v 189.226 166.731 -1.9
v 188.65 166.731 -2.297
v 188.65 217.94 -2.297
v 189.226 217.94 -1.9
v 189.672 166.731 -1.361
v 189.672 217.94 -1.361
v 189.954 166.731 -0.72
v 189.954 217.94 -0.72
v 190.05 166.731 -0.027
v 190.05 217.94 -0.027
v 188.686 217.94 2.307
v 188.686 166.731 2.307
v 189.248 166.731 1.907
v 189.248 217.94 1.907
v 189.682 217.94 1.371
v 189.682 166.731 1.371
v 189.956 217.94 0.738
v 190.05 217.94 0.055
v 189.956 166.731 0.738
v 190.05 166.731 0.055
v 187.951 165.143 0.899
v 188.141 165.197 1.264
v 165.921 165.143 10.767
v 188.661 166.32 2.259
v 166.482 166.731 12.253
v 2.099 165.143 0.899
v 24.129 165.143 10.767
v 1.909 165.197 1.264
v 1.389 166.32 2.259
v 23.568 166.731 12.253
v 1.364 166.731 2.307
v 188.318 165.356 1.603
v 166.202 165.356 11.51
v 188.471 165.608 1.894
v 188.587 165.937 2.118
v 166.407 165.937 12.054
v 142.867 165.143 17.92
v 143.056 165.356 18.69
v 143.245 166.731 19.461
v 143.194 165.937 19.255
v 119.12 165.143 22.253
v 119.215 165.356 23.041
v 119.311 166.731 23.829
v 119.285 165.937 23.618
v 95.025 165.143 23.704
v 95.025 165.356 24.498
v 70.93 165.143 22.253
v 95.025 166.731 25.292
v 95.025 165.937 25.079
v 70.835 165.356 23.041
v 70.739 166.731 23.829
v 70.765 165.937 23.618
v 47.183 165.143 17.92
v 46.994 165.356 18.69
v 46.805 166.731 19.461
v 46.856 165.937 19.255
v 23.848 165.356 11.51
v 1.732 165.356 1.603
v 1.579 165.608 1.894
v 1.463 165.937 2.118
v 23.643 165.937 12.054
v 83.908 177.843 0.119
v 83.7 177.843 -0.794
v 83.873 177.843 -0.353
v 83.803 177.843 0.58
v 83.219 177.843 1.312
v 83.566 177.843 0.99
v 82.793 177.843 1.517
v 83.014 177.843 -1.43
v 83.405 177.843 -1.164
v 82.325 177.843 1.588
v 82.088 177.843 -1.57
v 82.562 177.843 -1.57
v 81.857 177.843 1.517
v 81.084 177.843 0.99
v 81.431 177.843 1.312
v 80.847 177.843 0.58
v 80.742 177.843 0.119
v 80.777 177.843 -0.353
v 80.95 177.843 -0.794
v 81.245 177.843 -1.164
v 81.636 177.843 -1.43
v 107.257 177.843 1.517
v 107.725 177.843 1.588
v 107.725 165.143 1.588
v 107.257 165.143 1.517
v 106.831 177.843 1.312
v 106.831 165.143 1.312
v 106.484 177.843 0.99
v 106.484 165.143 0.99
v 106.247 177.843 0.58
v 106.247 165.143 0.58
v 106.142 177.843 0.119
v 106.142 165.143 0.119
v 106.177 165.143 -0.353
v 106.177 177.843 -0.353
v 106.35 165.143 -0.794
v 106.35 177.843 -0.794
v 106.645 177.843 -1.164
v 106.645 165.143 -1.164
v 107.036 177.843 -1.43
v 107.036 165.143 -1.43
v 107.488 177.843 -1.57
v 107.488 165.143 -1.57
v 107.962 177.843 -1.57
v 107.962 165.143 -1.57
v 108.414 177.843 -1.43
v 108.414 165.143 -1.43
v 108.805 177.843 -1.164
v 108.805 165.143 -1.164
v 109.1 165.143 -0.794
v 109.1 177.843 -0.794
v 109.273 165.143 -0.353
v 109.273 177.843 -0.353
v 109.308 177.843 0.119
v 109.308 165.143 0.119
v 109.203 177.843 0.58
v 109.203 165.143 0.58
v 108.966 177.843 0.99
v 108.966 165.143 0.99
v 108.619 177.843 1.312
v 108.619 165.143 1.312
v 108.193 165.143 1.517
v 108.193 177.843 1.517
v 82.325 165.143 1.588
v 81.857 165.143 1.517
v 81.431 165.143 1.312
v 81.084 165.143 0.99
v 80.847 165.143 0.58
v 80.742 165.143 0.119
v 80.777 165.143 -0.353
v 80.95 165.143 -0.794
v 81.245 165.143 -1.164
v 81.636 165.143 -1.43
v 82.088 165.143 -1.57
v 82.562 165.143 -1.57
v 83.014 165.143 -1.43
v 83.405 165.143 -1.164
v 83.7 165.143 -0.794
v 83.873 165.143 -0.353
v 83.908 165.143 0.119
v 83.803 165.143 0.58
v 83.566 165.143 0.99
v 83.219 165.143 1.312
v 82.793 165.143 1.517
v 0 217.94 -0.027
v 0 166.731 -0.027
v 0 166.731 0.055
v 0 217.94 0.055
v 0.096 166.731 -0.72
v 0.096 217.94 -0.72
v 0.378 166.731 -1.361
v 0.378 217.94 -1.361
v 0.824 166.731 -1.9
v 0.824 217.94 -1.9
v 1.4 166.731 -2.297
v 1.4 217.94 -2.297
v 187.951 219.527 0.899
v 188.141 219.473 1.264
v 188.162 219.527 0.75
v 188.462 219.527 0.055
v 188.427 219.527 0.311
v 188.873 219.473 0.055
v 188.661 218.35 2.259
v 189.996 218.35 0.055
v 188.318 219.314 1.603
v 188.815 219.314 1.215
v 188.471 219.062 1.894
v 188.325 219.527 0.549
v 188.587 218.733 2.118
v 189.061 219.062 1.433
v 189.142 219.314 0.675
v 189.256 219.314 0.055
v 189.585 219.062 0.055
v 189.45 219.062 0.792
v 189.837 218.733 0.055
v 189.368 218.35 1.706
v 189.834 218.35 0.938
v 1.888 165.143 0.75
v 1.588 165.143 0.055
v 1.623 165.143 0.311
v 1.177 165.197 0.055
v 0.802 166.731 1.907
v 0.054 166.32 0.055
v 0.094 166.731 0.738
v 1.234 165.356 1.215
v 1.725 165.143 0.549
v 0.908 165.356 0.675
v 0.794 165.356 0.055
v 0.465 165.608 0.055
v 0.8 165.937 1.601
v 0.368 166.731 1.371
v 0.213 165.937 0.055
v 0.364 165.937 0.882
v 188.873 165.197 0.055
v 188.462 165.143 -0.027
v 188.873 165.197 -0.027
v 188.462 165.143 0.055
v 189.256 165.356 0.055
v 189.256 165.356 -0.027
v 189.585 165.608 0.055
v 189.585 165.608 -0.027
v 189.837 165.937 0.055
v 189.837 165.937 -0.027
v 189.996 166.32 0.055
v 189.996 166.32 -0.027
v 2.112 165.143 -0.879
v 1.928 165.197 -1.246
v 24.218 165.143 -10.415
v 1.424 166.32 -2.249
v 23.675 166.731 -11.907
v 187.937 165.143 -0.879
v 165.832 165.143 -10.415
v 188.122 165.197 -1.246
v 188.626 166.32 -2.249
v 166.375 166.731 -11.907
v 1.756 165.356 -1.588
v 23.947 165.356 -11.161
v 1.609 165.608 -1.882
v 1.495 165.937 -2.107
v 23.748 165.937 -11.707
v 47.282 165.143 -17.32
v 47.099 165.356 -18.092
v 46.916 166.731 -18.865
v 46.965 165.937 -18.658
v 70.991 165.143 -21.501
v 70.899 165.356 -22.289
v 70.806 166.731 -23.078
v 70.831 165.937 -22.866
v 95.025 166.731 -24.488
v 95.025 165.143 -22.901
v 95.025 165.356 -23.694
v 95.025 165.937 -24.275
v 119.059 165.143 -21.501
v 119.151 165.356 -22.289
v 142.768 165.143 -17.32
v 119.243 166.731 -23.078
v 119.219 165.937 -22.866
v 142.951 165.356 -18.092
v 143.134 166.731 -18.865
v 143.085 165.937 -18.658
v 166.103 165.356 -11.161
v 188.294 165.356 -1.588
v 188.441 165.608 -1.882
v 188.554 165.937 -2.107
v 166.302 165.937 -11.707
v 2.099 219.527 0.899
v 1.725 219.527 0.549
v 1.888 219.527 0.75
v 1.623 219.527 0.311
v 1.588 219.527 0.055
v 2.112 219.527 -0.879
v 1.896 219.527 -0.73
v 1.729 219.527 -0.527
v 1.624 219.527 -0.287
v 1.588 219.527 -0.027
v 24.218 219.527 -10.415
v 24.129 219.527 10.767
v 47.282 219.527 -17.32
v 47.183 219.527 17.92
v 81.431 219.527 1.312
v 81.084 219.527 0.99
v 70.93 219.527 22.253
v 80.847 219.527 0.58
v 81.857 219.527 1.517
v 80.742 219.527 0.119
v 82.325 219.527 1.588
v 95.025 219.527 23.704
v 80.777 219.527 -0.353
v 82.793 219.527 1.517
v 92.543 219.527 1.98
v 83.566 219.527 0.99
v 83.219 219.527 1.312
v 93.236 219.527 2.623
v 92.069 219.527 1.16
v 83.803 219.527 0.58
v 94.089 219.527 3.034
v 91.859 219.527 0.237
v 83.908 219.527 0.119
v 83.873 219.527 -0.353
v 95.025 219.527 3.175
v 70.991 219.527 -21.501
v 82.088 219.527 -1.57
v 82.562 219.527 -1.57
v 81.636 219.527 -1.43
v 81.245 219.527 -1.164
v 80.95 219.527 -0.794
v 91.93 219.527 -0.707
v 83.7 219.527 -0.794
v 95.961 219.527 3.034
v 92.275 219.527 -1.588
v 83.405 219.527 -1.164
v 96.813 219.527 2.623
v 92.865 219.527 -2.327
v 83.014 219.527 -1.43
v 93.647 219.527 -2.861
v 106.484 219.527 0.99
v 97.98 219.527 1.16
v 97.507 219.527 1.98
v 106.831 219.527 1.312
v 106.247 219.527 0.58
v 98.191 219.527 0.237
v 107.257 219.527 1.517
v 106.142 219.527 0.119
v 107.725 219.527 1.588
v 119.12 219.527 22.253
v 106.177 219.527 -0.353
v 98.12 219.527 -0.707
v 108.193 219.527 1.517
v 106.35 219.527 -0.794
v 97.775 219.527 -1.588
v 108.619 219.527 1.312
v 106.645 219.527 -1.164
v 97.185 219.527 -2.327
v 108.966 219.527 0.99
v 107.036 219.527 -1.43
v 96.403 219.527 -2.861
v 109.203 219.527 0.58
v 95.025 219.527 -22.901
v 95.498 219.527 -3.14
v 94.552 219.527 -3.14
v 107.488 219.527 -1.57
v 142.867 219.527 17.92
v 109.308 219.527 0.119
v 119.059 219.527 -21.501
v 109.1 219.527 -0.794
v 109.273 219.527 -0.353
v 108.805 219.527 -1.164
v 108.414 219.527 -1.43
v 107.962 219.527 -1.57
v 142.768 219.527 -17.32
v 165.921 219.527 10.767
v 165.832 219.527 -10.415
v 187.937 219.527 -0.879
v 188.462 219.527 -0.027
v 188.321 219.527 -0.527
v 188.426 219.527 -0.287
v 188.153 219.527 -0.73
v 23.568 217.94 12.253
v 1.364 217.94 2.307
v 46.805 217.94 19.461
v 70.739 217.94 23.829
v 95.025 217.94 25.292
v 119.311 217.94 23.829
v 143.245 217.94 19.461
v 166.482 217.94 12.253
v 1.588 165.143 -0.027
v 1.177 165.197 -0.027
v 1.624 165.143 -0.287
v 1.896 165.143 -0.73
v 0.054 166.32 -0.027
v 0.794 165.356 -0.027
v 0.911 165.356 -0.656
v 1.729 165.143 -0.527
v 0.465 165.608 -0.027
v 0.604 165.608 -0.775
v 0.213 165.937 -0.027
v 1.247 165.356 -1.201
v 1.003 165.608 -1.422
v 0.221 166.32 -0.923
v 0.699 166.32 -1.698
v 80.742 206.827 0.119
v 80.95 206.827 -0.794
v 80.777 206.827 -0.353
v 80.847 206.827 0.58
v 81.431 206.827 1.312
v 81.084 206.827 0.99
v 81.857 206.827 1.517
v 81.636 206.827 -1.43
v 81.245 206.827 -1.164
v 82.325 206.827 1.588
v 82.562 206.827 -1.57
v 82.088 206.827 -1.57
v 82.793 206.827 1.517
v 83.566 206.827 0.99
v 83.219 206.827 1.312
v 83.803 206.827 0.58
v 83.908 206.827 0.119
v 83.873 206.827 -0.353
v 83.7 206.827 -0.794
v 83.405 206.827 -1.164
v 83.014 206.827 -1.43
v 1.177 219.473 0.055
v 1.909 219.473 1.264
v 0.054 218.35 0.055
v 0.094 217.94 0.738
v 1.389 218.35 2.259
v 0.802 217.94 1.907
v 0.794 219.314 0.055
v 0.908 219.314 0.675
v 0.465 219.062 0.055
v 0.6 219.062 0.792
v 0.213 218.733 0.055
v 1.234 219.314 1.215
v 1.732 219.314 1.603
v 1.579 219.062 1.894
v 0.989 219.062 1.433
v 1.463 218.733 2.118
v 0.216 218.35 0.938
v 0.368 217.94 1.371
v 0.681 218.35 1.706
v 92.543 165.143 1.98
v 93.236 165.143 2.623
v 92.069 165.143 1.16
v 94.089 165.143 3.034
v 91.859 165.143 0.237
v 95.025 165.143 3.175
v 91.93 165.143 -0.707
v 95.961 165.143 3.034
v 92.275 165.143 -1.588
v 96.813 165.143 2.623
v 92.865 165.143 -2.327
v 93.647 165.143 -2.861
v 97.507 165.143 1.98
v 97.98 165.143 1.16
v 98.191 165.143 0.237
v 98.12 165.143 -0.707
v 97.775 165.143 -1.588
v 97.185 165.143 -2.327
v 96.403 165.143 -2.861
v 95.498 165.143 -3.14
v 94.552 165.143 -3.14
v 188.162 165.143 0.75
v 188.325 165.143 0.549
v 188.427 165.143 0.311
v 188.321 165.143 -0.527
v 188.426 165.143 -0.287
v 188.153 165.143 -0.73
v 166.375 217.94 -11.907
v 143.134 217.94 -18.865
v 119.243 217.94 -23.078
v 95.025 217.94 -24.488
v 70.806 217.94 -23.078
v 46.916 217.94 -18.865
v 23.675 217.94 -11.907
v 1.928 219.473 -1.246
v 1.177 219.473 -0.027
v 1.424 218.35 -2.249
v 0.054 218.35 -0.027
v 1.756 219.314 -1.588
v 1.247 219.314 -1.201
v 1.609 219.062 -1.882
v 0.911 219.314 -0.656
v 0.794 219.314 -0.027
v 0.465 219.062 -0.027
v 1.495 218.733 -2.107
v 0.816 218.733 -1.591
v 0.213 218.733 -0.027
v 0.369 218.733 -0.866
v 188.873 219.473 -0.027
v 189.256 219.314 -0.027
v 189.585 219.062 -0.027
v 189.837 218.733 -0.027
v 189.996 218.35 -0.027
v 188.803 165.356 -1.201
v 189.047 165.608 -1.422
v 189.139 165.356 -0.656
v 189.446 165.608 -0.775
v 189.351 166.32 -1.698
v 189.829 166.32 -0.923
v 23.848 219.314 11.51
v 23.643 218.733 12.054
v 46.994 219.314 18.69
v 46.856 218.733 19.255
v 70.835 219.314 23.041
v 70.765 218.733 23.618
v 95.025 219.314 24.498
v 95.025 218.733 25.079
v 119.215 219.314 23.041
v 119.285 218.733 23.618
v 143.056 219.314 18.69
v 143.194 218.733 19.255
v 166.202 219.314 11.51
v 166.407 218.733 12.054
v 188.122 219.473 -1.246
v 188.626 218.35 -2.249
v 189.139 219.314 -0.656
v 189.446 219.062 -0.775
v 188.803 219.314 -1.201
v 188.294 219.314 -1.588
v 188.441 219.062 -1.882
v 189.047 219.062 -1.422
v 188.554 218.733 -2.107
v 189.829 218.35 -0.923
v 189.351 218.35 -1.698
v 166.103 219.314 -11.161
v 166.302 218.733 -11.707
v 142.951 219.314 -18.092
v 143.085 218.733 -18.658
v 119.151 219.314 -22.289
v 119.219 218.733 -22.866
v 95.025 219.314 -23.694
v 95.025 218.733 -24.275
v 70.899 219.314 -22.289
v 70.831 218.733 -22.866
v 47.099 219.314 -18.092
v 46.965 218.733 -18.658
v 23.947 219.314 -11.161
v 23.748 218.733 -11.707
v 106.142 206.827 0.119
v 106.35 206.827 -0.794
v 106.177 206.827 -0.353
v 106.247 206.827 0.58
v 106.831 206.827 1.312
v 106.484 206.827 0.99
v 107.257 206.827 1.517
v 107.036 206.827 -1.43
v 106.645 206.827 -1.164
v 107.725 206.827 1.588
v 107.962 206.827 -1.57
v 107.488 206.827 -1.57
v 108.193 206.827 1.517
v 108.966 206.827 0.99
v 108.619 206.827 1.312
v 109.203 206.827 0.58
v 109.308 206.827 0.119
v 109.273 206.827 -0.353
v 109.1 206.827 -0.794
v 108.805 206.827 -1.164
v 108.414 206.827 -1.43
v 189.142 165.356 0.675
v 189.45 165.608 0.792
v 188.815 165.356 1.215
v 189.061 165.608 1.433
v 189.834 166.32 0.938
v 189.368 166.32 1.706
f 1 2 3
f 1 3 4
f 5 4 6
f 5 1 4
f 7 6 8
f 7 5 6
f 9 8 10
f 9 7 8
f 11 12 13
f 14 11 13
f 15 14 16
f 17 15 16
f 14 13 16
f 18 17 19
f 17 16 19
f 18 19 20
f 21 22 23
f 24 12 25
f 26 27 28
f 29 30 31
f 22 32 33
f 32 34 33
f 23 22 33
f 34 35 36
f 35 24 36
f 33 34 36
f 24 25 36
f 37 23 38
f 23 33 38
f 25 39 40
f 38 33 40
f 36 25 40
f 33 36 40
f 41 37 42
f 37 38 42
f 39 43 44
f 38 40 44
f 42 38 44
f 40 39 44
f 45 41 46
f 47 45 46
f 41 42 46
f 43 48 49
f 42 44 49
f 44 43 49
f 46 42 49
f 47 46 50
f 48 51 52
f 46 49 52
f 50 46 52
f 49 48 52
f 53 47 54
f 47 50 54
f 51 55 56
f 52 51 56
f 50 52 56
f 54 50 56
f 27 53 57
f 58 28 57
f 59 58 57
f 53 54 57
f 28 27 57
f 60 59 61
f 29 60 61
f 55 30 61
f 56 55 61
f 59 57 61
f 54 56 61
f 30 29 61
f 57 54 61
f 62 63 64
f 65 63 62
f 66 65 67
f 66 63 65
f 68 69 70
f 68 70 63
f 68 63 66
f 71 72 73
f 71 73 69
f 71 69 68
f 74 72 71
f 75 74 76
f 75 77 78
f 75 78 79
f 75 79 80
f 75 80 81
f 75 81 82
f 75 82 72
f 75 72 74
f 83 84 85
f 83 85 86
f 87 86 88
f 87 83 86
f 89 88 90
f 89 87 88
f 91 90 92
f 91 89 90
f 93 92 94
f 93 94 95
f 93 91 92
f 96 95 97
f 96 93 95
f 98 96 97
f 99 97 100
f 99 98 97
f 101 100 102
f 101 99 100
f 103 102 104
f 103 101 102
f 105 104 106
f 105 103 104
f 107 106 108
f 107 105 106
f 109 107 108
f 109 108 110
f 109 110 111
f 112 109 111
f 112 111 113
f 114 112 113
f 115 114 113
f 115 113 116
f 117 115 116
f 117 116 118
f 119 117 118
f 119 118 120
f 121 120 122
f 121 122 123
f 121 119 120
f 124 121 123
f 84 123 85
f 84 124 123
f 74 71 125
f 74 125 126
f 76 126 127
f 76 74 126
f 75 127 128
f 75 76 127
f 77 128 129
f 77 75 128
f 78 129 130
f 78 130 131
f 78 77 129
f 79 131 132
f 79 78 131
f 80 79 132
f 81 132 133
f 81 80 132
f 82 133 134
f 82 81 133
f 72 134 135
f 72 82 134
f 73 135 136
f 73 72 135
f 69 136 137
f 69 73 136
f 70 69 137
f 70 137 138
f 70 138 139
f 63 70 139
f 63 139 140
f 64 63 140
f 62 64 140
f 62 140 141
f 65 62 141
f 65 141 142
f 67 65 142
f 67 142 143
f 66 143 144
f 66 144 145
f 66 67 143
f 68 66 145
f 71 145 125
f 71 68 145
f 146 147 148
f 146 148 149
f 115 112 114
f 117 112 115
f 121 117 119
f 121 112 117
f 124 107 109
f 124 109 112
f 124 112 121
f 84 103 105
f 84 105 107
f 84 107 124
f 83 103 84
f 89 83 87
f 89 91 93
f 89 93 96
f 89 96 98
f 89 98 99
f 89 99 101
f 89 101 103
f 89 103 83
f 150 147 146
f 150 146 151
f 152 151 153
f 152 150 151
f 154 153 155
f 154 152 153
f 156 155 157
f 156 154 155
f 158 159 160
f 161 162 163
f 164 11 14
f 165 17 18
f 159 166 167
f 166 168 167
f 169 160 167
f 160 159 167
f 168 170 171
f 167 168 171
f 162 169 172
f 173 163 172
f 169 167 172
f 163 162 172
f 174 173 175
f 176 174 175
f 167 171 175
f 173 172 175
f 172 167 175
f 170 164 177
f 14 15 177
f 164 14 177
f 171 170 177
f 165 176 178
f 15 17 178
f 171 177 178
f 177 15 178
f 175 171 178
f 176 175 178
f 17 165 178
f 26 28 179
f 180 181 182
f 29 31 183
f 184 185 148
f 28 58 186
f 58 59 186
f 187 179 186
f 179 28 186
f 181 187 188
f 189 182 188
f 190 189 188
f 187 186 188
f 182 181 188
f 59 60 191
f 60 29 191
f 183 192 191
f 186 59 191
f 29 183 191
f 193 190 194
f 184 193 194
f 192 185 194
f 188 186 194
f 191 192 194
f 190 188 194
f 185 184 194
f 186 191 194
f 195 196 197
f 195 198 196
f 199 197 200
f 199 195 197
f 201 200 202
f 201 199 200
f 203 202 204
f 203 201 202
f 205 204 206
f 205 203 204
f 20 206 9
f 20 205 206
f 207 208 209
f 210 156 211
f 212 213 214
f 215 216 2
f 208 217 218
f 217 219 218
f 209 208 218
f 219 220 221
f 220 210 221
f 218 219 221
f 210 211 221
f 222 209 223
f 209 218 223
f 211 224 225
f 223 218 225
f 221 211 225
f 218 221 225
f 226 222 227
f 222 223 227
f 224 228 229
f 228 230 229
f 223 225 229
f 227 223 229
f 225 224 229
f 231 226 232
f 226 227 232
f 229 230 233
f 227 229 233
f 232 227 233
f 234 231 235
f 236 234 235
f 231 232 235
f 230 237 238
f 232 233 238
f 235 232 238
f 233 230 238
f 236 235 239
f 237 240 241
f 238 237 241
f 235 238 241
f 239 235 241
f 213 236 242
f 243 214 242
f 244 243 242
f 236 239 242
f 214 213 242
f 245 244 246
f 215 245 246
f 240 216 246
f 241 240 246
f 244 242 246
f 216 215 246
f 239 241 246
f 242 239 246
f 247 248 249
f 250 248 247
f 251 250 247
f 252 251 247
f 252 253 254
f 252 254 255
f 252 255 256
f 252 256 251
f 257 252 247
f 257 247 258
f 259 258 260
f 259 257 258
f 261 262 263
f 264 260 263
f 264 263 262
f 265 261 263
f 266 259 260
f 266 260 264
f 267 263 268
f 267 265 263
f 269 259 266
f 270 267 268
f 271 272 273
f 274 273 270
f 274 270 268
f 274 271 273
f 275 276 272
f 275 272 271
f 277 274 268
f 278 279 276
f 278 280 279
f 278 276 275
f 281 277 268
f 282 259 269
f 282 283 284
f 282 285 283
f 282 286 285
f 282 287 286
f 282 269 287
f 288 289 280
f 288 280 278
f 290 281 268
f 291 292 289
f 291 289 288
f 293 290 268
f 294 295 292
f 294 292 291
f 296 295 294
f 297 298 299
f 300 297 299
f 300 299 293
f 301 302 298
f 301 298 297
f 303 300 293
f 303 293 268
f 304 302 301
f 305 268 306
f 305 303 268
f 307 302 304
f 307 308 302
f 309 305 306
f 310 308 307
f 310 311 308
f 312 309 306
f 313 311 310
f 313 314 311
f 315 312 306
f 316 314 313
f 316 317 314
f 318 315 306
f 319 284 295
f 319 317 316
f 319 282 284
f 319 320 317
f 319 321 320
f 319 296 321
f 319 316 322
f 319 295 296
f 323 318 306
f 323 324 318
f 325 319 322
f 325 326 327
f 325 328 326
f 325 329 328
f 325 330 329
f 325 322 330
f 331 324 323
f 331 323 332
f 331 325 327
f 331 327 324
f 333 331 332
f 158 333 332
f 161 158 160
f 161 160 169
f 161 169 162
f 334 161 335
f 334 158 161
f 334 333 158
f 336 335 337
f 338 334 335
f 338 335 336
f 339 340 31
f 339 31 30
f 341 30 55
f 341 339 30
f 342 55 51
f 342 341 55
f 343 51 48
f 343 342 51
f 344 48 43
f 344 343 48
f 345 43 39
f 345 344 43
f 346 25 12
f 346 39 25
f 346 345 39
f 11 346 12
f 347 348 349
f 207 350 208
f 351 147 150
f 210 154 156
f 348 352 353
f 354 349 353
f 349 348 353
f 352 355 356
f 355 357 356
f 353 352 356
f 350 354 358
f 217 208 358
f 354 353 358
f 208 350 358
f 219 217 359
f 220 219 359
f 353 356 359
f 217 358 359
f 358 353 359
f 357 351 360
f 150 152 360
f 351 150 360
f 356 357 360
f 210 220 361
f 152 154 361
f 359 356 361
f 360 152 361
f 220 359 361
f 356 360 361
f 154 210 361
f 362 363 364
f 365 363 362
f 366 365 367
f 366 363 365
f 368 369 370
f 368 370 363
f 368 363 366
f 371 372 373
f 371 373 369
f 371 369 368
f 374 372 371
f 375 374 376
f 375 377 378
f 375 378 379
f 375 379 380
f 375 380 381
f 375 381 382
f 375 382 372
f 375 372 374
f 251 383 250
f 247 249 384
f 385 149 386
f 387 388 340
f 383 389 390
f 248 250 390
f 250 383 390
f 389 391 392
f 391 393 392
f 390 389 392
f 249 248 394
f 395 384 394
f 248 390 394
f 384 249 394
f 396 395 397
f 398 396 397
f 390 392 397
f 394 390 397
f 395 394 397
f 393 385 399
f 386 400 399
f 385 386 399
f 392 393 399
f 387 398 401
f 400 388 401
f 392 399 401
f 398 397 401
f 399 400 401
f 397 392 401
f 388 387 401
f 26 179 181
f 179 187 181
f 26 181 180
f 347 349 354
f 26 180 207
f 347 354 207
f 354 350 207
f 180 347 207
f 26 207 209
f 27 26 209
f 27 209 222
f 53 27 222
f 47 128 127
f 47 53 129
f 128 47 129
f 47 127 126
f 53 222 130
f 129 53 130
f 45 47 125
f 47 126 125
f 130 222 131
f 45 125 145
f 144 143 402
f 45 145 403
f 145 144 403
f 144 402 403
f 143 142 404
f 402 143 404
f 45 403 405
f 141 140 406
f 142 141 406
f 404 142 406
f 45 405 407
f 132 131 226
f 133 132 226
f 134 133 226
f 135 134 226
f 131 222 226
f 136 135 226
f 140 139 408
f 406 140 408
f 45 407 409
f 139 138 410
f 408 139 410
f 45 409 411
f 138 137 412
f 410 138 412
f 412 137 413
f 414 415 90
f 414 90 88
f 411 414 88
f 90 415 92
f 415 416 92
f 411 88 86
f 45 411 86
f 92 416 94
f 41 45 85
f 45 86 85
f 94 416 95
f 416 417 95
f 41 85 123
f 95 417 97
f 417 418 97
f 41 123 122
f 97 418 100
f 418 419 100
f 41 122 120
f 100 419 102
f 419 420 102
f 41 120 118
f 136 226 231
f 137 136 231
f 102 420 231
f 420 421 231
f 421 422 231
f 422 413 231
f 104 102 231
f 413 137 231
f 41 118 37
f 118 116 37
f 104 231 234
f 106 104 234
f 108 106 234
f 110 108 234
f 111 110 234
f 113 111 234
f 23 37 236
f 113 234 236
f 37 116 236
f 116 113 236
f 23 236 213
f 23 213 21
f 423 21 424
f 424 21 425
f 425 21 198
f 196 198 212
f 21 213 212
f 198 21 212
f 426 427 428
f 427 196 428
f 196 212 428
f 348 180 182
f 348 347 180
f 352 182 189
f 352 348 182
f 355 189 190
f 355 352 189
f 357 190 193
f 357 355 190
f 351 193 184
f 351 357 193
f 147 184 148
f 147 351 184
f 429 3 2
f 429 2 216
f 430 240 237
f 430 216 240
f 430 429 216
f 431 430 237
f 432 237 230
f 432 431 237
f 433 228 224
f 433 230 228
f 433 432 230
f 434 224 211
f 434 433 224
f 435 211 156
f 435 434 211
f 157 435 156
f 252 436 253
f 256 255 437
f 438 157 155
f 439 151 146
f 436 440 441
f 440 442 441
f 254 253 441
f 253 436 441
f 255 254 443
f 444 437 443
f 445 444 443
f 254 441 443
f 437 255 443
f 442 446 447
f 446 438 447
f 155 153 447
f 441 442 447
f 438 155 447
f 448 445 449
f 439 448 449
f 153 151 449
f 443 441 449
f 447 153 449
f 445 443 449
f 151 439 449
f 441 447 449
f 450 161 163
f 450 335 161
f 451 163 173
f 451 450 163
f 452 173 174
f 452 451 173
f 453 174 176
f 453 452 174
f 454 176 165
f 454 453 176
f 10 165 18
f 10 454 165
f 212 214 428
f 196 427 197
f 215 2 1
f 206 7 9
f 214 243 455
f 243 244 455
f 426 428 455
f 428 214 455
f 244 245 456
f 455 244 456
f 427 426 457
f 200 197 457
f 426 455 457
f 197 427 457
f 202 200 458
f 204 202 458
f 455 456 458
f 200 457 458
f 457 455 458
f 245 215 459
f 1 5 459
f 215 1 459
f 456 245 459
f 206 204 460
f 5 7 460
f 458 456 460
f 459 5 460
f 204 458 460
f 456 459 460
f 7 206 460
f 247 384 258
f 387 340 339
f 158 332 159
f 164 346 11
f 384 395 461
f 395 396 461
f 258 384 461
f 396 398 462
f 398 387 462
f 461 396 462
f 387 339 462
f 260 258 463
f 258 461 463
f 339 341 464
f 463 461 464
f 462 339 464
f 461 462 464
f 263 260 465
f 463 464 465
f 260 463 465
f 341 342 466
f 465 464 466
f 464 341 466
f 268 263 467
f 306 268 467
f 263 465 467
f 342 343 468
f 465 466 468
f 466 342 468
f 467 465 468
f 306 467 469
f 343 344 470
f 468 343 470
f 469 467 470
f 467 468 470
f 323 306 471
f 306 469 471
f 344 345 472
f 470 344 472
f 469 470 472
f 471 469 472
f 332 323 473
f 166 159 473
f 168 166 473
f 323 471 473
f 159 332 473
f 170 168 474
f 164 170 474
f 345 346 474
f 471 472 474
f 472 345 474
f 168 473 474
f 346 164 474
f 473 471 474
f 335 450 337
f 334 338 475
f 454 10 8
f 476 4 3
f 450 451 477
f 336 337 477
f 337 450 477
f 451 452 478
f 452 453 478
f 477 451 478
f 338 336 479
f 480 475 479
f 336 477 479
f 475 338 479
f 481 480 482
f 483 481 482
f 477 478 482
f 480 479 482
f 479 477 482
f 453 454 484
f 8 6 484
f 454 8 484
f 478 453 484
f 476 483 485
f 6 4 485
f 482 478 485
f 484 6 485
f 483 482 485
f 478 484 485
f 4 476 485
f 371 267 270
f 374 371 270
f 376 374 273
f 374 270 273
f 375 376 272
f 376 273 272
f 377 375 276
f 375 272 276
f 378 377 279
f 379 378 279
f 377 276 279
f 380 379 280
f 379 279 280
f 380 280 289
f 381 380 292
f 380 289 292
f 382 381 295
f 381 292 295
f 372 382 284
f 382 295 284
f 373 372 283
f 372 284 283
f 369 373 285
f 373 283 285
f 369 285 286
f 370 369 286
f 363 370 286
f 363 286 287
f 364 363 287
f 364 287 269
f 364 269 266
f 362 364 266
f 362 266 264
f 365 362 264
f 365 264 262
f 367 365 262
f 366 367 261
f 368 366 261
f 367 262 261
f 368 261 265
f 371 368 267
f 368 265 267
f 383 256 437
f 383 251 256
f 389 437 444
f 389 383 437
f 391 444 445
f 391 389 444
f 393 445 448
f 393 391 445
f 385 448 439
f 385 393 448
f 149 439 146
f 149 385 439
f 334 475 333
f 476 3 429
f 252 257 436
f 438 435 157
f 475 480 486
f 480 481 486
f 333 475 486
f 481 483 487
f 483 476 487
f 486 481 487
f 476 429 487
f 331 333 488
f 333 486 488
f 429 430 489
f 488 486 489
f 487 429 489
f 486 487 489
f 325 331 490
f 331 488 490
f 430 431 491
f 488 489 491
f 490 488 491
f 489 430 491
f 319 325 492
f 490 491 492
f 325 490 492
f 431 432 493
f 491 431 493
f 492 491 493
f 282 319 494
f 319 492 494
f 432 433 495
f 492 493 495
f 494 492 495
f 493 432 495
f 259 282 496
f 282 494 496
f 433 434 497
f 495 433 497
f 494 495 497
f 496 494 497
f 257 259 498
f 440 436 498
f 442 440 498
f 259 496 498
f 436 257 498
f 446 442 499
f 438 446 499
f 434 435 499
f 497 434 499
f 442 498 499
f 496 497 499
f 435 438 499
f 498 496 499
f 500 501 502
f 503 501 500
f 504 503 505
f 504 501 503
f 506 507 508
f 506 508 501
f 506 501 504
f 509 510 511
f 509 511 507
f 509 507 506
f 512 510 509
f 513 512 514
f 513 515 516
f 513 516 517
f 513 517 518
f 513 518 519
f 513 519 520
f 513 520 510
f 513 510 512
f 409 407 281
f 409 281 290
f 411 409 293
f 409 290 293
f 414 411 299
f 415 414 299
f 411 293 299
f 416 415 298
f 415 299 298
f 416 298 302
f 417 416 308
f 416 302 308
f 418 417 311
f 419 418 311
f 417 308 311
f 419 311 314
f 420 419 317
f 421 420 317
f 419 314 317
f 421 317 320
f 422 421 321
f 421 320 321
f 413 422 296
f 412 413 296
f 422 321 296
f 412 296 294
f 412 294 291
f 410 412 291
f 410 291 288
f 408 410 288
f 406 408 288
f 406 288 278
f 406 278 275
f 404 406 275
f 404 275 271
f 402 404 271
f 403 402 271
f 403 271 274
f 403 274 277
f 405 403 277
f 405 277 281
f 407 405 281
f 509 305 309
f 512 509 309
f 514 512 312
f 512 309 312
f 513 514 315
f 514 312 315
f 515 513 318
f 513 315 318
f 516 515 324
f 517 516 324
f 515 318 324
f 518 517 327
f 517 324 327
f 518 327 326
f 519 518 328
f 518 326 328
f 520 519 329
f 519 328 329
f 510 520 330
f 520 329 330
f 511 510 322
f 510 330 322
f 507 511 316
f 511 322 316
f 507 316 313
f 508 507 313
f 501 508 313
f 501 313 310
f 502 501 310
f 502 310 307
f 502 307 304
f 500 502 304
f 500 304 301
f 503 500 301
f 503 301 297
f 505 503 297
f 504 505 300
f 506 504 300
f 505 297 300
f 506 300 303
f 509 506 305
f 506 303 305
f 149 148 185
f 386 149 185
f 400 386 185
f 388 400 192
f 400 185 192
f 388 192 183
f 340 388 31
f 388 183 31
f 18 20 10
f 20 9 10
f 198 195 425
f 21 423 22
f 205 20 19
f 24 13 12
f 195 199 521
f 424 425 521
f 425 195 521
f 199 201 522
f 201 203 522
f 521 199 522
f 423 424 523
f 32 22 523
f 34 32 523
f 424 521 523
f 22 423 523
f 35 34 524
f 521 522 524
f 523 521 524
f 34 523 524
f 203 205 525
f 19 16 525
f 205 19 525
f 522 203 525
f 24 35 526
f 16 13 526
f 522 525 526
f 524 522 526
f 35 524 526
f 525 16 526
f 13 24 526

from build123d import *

# Parameters (mm, degrees)
BOSS_EXTRUDE1_DEPTH      = 28.575
BOSS_EXTRUDE1_DEPTH_BACK = 28.575
SKETCH1_W                = 190.049903163
SKETCH1_H                = 54.384002277
SKETCH2_W                = 210.421602417
SKETCH2_H                = 85.92215432
CUT_EXTRUDE1_DEPTH       = 200.732611311
SKETCH3_R                = 3.175
CUT_EXTRUDE2_DEPTH       = 200.28936731
FILLET1_R                = 2.54
FILLET2_R                = 1.5875
SKETCH4_R                = 1.5875
CUT_EXTRUDE3_DEPTH       = 12.7
CUT_EXTRUDE4_START       = -12.7
SKETCH5_R                = 1.5875
CUT_EXTRUDE4_DEPTH       = 12.7


with BuildPart() as part:
    # Sketch1 → Boss-Extrude1 (new, two sides: drawn at the far end of the back side and taken through both)
    with BuildSketch(Plane.XY.offset(-BOSS_EXTRUDE1_DEPTH_BACK)):
        with Locations((95.024951582, 192.335070701)):
            Rectangle(SKETCH1_W, SKETCH1_H)
    extrude(amount=BOSS_EXTRUDE1_DEPTH + BOSS_EXTRUDE1_DEPTH_BACK)

    # Sketch2 → Cut-Extrude1 (cut, through all)
    with BuildSketch(Plane(origin=(0, 219.527071839, 0), x_dir=(1, 0, 0), z_dir=(0, 1, 0))):
        with Locations((94.245612314, -0.876756677)):
            Rectangle(SKETCH2_W, SKETCH2_H)
        with BuildLine():
            Line((0, 1.5875), (0, -1.5875))
            ThreePointArc((0, -1.5875), (95.024951582, -25.291629574), (190.049903163, -1.5875))
            Line((190.049903163, -1.5875), (190.049903163, 1.5875))
            ThreePointArc((190.049903163, 1.5875), (95.024951582, 24.488158935), (0, 1.5875))
        make_face(mode=Mode.SUBTRACT)
    extrude(amount=-CUT_EXTRUDE1_DEPTH, mode=Mode.SUBTRACT)

    # Sketch3 → Cut-Extrude2 (cut, through all)
    with BuildSketch(Plane(origin=(0, 219.527071839, 0), x_dir=(1, 0, 0), z_dir=(0, 1, 0))):
        with Locations((95.024951582, 0)):
            Circle(SKETCH3_R)
    extrude(amount=-CUT_EXTRUDE2_DEPTH, mode=Mode.SUBTRACT)

    # Fillet1
    fillet1_edges = [part.edges().sort_by_distance(p)[0] for p in [
        (190.049903163, 192.3350707, -1.5875),
        (190.049903163, 192.3350707, 1.5875),
        (0, 192.3350707, -1.5875),
        (0, 192.3350707, 1.5875),
    ]]
    fillet(fillet1_edges, radius=FILLET1_R)

    # Fillet2
    fillet2_edges = [part.edges().sort_by_distance(p)[0] for p in [
        (0.367643144, 165.143069562, 1.371374897),
        (0, 165.143069562, 0.013840704),
        (0.378145075, 165.143069562, -1.36087226),
        (95.024951582, 165.143069562, -24.488158935),
        (189.671758089, 165.143069562, -1.36087226),
        (190.049903163, 165.143069562, 0.013840704),
        (189.68226002, 165.143069562, 1.371374897),
        (0.367643144, 219.527071839, 1.371374897),
        (0, 219.527071839, 0.013840704),
        (0.378145075, 219.527071839, -1.36087226),
        (95.024951582, 219.527071839, -24.488158935),
        (189.671758089, 219.527071839, -1.36087226),
        (190.049903163, 219.527071839, 0.013840704),
        (189.68226002, 219.527071839, 1.371374897),
        (95.024951582, 165.143069562, 25.291629574),
        (95.024951582, 219.527071839, 25.291629574),
    ]]
    fillet(fillet2_edges, radius=FILLET2_R)

    # Sketch4 → Cut-Extrude3 (cut)
    with BuildSketch(Plane(origin=(0, 219.527071839, 0), x_dir=(1, 0, 0), z_dir=(0, 1, 0))):
        with Locations((107.724951582, 0)):
            Circle(SKETCH4_R)
        with Locations((82.324951582, 0)):
            Circle(SKETCH4_R)
    extrude(amount=-CUT_EXTRUDE3_DEPTH, mode=Mode.SUBTRACT)

    # Sketch5 → Cut-Extrude4 (cut)
    with BuildSketch(Plane.XZ.offset(-165.143069562).offset(CUT_EXTRUDE4_START)):
        with Locations((82.324951582, 0)):
            Circle(SKETCH5_R)
        with Locations((107.724951582, 0)):
            Circle(SKETCH5_R)
    extrude(amount=CUT_EXTRUDE4_DEPTH, mode=Mode.SUBTRACT)


solid = part.part
